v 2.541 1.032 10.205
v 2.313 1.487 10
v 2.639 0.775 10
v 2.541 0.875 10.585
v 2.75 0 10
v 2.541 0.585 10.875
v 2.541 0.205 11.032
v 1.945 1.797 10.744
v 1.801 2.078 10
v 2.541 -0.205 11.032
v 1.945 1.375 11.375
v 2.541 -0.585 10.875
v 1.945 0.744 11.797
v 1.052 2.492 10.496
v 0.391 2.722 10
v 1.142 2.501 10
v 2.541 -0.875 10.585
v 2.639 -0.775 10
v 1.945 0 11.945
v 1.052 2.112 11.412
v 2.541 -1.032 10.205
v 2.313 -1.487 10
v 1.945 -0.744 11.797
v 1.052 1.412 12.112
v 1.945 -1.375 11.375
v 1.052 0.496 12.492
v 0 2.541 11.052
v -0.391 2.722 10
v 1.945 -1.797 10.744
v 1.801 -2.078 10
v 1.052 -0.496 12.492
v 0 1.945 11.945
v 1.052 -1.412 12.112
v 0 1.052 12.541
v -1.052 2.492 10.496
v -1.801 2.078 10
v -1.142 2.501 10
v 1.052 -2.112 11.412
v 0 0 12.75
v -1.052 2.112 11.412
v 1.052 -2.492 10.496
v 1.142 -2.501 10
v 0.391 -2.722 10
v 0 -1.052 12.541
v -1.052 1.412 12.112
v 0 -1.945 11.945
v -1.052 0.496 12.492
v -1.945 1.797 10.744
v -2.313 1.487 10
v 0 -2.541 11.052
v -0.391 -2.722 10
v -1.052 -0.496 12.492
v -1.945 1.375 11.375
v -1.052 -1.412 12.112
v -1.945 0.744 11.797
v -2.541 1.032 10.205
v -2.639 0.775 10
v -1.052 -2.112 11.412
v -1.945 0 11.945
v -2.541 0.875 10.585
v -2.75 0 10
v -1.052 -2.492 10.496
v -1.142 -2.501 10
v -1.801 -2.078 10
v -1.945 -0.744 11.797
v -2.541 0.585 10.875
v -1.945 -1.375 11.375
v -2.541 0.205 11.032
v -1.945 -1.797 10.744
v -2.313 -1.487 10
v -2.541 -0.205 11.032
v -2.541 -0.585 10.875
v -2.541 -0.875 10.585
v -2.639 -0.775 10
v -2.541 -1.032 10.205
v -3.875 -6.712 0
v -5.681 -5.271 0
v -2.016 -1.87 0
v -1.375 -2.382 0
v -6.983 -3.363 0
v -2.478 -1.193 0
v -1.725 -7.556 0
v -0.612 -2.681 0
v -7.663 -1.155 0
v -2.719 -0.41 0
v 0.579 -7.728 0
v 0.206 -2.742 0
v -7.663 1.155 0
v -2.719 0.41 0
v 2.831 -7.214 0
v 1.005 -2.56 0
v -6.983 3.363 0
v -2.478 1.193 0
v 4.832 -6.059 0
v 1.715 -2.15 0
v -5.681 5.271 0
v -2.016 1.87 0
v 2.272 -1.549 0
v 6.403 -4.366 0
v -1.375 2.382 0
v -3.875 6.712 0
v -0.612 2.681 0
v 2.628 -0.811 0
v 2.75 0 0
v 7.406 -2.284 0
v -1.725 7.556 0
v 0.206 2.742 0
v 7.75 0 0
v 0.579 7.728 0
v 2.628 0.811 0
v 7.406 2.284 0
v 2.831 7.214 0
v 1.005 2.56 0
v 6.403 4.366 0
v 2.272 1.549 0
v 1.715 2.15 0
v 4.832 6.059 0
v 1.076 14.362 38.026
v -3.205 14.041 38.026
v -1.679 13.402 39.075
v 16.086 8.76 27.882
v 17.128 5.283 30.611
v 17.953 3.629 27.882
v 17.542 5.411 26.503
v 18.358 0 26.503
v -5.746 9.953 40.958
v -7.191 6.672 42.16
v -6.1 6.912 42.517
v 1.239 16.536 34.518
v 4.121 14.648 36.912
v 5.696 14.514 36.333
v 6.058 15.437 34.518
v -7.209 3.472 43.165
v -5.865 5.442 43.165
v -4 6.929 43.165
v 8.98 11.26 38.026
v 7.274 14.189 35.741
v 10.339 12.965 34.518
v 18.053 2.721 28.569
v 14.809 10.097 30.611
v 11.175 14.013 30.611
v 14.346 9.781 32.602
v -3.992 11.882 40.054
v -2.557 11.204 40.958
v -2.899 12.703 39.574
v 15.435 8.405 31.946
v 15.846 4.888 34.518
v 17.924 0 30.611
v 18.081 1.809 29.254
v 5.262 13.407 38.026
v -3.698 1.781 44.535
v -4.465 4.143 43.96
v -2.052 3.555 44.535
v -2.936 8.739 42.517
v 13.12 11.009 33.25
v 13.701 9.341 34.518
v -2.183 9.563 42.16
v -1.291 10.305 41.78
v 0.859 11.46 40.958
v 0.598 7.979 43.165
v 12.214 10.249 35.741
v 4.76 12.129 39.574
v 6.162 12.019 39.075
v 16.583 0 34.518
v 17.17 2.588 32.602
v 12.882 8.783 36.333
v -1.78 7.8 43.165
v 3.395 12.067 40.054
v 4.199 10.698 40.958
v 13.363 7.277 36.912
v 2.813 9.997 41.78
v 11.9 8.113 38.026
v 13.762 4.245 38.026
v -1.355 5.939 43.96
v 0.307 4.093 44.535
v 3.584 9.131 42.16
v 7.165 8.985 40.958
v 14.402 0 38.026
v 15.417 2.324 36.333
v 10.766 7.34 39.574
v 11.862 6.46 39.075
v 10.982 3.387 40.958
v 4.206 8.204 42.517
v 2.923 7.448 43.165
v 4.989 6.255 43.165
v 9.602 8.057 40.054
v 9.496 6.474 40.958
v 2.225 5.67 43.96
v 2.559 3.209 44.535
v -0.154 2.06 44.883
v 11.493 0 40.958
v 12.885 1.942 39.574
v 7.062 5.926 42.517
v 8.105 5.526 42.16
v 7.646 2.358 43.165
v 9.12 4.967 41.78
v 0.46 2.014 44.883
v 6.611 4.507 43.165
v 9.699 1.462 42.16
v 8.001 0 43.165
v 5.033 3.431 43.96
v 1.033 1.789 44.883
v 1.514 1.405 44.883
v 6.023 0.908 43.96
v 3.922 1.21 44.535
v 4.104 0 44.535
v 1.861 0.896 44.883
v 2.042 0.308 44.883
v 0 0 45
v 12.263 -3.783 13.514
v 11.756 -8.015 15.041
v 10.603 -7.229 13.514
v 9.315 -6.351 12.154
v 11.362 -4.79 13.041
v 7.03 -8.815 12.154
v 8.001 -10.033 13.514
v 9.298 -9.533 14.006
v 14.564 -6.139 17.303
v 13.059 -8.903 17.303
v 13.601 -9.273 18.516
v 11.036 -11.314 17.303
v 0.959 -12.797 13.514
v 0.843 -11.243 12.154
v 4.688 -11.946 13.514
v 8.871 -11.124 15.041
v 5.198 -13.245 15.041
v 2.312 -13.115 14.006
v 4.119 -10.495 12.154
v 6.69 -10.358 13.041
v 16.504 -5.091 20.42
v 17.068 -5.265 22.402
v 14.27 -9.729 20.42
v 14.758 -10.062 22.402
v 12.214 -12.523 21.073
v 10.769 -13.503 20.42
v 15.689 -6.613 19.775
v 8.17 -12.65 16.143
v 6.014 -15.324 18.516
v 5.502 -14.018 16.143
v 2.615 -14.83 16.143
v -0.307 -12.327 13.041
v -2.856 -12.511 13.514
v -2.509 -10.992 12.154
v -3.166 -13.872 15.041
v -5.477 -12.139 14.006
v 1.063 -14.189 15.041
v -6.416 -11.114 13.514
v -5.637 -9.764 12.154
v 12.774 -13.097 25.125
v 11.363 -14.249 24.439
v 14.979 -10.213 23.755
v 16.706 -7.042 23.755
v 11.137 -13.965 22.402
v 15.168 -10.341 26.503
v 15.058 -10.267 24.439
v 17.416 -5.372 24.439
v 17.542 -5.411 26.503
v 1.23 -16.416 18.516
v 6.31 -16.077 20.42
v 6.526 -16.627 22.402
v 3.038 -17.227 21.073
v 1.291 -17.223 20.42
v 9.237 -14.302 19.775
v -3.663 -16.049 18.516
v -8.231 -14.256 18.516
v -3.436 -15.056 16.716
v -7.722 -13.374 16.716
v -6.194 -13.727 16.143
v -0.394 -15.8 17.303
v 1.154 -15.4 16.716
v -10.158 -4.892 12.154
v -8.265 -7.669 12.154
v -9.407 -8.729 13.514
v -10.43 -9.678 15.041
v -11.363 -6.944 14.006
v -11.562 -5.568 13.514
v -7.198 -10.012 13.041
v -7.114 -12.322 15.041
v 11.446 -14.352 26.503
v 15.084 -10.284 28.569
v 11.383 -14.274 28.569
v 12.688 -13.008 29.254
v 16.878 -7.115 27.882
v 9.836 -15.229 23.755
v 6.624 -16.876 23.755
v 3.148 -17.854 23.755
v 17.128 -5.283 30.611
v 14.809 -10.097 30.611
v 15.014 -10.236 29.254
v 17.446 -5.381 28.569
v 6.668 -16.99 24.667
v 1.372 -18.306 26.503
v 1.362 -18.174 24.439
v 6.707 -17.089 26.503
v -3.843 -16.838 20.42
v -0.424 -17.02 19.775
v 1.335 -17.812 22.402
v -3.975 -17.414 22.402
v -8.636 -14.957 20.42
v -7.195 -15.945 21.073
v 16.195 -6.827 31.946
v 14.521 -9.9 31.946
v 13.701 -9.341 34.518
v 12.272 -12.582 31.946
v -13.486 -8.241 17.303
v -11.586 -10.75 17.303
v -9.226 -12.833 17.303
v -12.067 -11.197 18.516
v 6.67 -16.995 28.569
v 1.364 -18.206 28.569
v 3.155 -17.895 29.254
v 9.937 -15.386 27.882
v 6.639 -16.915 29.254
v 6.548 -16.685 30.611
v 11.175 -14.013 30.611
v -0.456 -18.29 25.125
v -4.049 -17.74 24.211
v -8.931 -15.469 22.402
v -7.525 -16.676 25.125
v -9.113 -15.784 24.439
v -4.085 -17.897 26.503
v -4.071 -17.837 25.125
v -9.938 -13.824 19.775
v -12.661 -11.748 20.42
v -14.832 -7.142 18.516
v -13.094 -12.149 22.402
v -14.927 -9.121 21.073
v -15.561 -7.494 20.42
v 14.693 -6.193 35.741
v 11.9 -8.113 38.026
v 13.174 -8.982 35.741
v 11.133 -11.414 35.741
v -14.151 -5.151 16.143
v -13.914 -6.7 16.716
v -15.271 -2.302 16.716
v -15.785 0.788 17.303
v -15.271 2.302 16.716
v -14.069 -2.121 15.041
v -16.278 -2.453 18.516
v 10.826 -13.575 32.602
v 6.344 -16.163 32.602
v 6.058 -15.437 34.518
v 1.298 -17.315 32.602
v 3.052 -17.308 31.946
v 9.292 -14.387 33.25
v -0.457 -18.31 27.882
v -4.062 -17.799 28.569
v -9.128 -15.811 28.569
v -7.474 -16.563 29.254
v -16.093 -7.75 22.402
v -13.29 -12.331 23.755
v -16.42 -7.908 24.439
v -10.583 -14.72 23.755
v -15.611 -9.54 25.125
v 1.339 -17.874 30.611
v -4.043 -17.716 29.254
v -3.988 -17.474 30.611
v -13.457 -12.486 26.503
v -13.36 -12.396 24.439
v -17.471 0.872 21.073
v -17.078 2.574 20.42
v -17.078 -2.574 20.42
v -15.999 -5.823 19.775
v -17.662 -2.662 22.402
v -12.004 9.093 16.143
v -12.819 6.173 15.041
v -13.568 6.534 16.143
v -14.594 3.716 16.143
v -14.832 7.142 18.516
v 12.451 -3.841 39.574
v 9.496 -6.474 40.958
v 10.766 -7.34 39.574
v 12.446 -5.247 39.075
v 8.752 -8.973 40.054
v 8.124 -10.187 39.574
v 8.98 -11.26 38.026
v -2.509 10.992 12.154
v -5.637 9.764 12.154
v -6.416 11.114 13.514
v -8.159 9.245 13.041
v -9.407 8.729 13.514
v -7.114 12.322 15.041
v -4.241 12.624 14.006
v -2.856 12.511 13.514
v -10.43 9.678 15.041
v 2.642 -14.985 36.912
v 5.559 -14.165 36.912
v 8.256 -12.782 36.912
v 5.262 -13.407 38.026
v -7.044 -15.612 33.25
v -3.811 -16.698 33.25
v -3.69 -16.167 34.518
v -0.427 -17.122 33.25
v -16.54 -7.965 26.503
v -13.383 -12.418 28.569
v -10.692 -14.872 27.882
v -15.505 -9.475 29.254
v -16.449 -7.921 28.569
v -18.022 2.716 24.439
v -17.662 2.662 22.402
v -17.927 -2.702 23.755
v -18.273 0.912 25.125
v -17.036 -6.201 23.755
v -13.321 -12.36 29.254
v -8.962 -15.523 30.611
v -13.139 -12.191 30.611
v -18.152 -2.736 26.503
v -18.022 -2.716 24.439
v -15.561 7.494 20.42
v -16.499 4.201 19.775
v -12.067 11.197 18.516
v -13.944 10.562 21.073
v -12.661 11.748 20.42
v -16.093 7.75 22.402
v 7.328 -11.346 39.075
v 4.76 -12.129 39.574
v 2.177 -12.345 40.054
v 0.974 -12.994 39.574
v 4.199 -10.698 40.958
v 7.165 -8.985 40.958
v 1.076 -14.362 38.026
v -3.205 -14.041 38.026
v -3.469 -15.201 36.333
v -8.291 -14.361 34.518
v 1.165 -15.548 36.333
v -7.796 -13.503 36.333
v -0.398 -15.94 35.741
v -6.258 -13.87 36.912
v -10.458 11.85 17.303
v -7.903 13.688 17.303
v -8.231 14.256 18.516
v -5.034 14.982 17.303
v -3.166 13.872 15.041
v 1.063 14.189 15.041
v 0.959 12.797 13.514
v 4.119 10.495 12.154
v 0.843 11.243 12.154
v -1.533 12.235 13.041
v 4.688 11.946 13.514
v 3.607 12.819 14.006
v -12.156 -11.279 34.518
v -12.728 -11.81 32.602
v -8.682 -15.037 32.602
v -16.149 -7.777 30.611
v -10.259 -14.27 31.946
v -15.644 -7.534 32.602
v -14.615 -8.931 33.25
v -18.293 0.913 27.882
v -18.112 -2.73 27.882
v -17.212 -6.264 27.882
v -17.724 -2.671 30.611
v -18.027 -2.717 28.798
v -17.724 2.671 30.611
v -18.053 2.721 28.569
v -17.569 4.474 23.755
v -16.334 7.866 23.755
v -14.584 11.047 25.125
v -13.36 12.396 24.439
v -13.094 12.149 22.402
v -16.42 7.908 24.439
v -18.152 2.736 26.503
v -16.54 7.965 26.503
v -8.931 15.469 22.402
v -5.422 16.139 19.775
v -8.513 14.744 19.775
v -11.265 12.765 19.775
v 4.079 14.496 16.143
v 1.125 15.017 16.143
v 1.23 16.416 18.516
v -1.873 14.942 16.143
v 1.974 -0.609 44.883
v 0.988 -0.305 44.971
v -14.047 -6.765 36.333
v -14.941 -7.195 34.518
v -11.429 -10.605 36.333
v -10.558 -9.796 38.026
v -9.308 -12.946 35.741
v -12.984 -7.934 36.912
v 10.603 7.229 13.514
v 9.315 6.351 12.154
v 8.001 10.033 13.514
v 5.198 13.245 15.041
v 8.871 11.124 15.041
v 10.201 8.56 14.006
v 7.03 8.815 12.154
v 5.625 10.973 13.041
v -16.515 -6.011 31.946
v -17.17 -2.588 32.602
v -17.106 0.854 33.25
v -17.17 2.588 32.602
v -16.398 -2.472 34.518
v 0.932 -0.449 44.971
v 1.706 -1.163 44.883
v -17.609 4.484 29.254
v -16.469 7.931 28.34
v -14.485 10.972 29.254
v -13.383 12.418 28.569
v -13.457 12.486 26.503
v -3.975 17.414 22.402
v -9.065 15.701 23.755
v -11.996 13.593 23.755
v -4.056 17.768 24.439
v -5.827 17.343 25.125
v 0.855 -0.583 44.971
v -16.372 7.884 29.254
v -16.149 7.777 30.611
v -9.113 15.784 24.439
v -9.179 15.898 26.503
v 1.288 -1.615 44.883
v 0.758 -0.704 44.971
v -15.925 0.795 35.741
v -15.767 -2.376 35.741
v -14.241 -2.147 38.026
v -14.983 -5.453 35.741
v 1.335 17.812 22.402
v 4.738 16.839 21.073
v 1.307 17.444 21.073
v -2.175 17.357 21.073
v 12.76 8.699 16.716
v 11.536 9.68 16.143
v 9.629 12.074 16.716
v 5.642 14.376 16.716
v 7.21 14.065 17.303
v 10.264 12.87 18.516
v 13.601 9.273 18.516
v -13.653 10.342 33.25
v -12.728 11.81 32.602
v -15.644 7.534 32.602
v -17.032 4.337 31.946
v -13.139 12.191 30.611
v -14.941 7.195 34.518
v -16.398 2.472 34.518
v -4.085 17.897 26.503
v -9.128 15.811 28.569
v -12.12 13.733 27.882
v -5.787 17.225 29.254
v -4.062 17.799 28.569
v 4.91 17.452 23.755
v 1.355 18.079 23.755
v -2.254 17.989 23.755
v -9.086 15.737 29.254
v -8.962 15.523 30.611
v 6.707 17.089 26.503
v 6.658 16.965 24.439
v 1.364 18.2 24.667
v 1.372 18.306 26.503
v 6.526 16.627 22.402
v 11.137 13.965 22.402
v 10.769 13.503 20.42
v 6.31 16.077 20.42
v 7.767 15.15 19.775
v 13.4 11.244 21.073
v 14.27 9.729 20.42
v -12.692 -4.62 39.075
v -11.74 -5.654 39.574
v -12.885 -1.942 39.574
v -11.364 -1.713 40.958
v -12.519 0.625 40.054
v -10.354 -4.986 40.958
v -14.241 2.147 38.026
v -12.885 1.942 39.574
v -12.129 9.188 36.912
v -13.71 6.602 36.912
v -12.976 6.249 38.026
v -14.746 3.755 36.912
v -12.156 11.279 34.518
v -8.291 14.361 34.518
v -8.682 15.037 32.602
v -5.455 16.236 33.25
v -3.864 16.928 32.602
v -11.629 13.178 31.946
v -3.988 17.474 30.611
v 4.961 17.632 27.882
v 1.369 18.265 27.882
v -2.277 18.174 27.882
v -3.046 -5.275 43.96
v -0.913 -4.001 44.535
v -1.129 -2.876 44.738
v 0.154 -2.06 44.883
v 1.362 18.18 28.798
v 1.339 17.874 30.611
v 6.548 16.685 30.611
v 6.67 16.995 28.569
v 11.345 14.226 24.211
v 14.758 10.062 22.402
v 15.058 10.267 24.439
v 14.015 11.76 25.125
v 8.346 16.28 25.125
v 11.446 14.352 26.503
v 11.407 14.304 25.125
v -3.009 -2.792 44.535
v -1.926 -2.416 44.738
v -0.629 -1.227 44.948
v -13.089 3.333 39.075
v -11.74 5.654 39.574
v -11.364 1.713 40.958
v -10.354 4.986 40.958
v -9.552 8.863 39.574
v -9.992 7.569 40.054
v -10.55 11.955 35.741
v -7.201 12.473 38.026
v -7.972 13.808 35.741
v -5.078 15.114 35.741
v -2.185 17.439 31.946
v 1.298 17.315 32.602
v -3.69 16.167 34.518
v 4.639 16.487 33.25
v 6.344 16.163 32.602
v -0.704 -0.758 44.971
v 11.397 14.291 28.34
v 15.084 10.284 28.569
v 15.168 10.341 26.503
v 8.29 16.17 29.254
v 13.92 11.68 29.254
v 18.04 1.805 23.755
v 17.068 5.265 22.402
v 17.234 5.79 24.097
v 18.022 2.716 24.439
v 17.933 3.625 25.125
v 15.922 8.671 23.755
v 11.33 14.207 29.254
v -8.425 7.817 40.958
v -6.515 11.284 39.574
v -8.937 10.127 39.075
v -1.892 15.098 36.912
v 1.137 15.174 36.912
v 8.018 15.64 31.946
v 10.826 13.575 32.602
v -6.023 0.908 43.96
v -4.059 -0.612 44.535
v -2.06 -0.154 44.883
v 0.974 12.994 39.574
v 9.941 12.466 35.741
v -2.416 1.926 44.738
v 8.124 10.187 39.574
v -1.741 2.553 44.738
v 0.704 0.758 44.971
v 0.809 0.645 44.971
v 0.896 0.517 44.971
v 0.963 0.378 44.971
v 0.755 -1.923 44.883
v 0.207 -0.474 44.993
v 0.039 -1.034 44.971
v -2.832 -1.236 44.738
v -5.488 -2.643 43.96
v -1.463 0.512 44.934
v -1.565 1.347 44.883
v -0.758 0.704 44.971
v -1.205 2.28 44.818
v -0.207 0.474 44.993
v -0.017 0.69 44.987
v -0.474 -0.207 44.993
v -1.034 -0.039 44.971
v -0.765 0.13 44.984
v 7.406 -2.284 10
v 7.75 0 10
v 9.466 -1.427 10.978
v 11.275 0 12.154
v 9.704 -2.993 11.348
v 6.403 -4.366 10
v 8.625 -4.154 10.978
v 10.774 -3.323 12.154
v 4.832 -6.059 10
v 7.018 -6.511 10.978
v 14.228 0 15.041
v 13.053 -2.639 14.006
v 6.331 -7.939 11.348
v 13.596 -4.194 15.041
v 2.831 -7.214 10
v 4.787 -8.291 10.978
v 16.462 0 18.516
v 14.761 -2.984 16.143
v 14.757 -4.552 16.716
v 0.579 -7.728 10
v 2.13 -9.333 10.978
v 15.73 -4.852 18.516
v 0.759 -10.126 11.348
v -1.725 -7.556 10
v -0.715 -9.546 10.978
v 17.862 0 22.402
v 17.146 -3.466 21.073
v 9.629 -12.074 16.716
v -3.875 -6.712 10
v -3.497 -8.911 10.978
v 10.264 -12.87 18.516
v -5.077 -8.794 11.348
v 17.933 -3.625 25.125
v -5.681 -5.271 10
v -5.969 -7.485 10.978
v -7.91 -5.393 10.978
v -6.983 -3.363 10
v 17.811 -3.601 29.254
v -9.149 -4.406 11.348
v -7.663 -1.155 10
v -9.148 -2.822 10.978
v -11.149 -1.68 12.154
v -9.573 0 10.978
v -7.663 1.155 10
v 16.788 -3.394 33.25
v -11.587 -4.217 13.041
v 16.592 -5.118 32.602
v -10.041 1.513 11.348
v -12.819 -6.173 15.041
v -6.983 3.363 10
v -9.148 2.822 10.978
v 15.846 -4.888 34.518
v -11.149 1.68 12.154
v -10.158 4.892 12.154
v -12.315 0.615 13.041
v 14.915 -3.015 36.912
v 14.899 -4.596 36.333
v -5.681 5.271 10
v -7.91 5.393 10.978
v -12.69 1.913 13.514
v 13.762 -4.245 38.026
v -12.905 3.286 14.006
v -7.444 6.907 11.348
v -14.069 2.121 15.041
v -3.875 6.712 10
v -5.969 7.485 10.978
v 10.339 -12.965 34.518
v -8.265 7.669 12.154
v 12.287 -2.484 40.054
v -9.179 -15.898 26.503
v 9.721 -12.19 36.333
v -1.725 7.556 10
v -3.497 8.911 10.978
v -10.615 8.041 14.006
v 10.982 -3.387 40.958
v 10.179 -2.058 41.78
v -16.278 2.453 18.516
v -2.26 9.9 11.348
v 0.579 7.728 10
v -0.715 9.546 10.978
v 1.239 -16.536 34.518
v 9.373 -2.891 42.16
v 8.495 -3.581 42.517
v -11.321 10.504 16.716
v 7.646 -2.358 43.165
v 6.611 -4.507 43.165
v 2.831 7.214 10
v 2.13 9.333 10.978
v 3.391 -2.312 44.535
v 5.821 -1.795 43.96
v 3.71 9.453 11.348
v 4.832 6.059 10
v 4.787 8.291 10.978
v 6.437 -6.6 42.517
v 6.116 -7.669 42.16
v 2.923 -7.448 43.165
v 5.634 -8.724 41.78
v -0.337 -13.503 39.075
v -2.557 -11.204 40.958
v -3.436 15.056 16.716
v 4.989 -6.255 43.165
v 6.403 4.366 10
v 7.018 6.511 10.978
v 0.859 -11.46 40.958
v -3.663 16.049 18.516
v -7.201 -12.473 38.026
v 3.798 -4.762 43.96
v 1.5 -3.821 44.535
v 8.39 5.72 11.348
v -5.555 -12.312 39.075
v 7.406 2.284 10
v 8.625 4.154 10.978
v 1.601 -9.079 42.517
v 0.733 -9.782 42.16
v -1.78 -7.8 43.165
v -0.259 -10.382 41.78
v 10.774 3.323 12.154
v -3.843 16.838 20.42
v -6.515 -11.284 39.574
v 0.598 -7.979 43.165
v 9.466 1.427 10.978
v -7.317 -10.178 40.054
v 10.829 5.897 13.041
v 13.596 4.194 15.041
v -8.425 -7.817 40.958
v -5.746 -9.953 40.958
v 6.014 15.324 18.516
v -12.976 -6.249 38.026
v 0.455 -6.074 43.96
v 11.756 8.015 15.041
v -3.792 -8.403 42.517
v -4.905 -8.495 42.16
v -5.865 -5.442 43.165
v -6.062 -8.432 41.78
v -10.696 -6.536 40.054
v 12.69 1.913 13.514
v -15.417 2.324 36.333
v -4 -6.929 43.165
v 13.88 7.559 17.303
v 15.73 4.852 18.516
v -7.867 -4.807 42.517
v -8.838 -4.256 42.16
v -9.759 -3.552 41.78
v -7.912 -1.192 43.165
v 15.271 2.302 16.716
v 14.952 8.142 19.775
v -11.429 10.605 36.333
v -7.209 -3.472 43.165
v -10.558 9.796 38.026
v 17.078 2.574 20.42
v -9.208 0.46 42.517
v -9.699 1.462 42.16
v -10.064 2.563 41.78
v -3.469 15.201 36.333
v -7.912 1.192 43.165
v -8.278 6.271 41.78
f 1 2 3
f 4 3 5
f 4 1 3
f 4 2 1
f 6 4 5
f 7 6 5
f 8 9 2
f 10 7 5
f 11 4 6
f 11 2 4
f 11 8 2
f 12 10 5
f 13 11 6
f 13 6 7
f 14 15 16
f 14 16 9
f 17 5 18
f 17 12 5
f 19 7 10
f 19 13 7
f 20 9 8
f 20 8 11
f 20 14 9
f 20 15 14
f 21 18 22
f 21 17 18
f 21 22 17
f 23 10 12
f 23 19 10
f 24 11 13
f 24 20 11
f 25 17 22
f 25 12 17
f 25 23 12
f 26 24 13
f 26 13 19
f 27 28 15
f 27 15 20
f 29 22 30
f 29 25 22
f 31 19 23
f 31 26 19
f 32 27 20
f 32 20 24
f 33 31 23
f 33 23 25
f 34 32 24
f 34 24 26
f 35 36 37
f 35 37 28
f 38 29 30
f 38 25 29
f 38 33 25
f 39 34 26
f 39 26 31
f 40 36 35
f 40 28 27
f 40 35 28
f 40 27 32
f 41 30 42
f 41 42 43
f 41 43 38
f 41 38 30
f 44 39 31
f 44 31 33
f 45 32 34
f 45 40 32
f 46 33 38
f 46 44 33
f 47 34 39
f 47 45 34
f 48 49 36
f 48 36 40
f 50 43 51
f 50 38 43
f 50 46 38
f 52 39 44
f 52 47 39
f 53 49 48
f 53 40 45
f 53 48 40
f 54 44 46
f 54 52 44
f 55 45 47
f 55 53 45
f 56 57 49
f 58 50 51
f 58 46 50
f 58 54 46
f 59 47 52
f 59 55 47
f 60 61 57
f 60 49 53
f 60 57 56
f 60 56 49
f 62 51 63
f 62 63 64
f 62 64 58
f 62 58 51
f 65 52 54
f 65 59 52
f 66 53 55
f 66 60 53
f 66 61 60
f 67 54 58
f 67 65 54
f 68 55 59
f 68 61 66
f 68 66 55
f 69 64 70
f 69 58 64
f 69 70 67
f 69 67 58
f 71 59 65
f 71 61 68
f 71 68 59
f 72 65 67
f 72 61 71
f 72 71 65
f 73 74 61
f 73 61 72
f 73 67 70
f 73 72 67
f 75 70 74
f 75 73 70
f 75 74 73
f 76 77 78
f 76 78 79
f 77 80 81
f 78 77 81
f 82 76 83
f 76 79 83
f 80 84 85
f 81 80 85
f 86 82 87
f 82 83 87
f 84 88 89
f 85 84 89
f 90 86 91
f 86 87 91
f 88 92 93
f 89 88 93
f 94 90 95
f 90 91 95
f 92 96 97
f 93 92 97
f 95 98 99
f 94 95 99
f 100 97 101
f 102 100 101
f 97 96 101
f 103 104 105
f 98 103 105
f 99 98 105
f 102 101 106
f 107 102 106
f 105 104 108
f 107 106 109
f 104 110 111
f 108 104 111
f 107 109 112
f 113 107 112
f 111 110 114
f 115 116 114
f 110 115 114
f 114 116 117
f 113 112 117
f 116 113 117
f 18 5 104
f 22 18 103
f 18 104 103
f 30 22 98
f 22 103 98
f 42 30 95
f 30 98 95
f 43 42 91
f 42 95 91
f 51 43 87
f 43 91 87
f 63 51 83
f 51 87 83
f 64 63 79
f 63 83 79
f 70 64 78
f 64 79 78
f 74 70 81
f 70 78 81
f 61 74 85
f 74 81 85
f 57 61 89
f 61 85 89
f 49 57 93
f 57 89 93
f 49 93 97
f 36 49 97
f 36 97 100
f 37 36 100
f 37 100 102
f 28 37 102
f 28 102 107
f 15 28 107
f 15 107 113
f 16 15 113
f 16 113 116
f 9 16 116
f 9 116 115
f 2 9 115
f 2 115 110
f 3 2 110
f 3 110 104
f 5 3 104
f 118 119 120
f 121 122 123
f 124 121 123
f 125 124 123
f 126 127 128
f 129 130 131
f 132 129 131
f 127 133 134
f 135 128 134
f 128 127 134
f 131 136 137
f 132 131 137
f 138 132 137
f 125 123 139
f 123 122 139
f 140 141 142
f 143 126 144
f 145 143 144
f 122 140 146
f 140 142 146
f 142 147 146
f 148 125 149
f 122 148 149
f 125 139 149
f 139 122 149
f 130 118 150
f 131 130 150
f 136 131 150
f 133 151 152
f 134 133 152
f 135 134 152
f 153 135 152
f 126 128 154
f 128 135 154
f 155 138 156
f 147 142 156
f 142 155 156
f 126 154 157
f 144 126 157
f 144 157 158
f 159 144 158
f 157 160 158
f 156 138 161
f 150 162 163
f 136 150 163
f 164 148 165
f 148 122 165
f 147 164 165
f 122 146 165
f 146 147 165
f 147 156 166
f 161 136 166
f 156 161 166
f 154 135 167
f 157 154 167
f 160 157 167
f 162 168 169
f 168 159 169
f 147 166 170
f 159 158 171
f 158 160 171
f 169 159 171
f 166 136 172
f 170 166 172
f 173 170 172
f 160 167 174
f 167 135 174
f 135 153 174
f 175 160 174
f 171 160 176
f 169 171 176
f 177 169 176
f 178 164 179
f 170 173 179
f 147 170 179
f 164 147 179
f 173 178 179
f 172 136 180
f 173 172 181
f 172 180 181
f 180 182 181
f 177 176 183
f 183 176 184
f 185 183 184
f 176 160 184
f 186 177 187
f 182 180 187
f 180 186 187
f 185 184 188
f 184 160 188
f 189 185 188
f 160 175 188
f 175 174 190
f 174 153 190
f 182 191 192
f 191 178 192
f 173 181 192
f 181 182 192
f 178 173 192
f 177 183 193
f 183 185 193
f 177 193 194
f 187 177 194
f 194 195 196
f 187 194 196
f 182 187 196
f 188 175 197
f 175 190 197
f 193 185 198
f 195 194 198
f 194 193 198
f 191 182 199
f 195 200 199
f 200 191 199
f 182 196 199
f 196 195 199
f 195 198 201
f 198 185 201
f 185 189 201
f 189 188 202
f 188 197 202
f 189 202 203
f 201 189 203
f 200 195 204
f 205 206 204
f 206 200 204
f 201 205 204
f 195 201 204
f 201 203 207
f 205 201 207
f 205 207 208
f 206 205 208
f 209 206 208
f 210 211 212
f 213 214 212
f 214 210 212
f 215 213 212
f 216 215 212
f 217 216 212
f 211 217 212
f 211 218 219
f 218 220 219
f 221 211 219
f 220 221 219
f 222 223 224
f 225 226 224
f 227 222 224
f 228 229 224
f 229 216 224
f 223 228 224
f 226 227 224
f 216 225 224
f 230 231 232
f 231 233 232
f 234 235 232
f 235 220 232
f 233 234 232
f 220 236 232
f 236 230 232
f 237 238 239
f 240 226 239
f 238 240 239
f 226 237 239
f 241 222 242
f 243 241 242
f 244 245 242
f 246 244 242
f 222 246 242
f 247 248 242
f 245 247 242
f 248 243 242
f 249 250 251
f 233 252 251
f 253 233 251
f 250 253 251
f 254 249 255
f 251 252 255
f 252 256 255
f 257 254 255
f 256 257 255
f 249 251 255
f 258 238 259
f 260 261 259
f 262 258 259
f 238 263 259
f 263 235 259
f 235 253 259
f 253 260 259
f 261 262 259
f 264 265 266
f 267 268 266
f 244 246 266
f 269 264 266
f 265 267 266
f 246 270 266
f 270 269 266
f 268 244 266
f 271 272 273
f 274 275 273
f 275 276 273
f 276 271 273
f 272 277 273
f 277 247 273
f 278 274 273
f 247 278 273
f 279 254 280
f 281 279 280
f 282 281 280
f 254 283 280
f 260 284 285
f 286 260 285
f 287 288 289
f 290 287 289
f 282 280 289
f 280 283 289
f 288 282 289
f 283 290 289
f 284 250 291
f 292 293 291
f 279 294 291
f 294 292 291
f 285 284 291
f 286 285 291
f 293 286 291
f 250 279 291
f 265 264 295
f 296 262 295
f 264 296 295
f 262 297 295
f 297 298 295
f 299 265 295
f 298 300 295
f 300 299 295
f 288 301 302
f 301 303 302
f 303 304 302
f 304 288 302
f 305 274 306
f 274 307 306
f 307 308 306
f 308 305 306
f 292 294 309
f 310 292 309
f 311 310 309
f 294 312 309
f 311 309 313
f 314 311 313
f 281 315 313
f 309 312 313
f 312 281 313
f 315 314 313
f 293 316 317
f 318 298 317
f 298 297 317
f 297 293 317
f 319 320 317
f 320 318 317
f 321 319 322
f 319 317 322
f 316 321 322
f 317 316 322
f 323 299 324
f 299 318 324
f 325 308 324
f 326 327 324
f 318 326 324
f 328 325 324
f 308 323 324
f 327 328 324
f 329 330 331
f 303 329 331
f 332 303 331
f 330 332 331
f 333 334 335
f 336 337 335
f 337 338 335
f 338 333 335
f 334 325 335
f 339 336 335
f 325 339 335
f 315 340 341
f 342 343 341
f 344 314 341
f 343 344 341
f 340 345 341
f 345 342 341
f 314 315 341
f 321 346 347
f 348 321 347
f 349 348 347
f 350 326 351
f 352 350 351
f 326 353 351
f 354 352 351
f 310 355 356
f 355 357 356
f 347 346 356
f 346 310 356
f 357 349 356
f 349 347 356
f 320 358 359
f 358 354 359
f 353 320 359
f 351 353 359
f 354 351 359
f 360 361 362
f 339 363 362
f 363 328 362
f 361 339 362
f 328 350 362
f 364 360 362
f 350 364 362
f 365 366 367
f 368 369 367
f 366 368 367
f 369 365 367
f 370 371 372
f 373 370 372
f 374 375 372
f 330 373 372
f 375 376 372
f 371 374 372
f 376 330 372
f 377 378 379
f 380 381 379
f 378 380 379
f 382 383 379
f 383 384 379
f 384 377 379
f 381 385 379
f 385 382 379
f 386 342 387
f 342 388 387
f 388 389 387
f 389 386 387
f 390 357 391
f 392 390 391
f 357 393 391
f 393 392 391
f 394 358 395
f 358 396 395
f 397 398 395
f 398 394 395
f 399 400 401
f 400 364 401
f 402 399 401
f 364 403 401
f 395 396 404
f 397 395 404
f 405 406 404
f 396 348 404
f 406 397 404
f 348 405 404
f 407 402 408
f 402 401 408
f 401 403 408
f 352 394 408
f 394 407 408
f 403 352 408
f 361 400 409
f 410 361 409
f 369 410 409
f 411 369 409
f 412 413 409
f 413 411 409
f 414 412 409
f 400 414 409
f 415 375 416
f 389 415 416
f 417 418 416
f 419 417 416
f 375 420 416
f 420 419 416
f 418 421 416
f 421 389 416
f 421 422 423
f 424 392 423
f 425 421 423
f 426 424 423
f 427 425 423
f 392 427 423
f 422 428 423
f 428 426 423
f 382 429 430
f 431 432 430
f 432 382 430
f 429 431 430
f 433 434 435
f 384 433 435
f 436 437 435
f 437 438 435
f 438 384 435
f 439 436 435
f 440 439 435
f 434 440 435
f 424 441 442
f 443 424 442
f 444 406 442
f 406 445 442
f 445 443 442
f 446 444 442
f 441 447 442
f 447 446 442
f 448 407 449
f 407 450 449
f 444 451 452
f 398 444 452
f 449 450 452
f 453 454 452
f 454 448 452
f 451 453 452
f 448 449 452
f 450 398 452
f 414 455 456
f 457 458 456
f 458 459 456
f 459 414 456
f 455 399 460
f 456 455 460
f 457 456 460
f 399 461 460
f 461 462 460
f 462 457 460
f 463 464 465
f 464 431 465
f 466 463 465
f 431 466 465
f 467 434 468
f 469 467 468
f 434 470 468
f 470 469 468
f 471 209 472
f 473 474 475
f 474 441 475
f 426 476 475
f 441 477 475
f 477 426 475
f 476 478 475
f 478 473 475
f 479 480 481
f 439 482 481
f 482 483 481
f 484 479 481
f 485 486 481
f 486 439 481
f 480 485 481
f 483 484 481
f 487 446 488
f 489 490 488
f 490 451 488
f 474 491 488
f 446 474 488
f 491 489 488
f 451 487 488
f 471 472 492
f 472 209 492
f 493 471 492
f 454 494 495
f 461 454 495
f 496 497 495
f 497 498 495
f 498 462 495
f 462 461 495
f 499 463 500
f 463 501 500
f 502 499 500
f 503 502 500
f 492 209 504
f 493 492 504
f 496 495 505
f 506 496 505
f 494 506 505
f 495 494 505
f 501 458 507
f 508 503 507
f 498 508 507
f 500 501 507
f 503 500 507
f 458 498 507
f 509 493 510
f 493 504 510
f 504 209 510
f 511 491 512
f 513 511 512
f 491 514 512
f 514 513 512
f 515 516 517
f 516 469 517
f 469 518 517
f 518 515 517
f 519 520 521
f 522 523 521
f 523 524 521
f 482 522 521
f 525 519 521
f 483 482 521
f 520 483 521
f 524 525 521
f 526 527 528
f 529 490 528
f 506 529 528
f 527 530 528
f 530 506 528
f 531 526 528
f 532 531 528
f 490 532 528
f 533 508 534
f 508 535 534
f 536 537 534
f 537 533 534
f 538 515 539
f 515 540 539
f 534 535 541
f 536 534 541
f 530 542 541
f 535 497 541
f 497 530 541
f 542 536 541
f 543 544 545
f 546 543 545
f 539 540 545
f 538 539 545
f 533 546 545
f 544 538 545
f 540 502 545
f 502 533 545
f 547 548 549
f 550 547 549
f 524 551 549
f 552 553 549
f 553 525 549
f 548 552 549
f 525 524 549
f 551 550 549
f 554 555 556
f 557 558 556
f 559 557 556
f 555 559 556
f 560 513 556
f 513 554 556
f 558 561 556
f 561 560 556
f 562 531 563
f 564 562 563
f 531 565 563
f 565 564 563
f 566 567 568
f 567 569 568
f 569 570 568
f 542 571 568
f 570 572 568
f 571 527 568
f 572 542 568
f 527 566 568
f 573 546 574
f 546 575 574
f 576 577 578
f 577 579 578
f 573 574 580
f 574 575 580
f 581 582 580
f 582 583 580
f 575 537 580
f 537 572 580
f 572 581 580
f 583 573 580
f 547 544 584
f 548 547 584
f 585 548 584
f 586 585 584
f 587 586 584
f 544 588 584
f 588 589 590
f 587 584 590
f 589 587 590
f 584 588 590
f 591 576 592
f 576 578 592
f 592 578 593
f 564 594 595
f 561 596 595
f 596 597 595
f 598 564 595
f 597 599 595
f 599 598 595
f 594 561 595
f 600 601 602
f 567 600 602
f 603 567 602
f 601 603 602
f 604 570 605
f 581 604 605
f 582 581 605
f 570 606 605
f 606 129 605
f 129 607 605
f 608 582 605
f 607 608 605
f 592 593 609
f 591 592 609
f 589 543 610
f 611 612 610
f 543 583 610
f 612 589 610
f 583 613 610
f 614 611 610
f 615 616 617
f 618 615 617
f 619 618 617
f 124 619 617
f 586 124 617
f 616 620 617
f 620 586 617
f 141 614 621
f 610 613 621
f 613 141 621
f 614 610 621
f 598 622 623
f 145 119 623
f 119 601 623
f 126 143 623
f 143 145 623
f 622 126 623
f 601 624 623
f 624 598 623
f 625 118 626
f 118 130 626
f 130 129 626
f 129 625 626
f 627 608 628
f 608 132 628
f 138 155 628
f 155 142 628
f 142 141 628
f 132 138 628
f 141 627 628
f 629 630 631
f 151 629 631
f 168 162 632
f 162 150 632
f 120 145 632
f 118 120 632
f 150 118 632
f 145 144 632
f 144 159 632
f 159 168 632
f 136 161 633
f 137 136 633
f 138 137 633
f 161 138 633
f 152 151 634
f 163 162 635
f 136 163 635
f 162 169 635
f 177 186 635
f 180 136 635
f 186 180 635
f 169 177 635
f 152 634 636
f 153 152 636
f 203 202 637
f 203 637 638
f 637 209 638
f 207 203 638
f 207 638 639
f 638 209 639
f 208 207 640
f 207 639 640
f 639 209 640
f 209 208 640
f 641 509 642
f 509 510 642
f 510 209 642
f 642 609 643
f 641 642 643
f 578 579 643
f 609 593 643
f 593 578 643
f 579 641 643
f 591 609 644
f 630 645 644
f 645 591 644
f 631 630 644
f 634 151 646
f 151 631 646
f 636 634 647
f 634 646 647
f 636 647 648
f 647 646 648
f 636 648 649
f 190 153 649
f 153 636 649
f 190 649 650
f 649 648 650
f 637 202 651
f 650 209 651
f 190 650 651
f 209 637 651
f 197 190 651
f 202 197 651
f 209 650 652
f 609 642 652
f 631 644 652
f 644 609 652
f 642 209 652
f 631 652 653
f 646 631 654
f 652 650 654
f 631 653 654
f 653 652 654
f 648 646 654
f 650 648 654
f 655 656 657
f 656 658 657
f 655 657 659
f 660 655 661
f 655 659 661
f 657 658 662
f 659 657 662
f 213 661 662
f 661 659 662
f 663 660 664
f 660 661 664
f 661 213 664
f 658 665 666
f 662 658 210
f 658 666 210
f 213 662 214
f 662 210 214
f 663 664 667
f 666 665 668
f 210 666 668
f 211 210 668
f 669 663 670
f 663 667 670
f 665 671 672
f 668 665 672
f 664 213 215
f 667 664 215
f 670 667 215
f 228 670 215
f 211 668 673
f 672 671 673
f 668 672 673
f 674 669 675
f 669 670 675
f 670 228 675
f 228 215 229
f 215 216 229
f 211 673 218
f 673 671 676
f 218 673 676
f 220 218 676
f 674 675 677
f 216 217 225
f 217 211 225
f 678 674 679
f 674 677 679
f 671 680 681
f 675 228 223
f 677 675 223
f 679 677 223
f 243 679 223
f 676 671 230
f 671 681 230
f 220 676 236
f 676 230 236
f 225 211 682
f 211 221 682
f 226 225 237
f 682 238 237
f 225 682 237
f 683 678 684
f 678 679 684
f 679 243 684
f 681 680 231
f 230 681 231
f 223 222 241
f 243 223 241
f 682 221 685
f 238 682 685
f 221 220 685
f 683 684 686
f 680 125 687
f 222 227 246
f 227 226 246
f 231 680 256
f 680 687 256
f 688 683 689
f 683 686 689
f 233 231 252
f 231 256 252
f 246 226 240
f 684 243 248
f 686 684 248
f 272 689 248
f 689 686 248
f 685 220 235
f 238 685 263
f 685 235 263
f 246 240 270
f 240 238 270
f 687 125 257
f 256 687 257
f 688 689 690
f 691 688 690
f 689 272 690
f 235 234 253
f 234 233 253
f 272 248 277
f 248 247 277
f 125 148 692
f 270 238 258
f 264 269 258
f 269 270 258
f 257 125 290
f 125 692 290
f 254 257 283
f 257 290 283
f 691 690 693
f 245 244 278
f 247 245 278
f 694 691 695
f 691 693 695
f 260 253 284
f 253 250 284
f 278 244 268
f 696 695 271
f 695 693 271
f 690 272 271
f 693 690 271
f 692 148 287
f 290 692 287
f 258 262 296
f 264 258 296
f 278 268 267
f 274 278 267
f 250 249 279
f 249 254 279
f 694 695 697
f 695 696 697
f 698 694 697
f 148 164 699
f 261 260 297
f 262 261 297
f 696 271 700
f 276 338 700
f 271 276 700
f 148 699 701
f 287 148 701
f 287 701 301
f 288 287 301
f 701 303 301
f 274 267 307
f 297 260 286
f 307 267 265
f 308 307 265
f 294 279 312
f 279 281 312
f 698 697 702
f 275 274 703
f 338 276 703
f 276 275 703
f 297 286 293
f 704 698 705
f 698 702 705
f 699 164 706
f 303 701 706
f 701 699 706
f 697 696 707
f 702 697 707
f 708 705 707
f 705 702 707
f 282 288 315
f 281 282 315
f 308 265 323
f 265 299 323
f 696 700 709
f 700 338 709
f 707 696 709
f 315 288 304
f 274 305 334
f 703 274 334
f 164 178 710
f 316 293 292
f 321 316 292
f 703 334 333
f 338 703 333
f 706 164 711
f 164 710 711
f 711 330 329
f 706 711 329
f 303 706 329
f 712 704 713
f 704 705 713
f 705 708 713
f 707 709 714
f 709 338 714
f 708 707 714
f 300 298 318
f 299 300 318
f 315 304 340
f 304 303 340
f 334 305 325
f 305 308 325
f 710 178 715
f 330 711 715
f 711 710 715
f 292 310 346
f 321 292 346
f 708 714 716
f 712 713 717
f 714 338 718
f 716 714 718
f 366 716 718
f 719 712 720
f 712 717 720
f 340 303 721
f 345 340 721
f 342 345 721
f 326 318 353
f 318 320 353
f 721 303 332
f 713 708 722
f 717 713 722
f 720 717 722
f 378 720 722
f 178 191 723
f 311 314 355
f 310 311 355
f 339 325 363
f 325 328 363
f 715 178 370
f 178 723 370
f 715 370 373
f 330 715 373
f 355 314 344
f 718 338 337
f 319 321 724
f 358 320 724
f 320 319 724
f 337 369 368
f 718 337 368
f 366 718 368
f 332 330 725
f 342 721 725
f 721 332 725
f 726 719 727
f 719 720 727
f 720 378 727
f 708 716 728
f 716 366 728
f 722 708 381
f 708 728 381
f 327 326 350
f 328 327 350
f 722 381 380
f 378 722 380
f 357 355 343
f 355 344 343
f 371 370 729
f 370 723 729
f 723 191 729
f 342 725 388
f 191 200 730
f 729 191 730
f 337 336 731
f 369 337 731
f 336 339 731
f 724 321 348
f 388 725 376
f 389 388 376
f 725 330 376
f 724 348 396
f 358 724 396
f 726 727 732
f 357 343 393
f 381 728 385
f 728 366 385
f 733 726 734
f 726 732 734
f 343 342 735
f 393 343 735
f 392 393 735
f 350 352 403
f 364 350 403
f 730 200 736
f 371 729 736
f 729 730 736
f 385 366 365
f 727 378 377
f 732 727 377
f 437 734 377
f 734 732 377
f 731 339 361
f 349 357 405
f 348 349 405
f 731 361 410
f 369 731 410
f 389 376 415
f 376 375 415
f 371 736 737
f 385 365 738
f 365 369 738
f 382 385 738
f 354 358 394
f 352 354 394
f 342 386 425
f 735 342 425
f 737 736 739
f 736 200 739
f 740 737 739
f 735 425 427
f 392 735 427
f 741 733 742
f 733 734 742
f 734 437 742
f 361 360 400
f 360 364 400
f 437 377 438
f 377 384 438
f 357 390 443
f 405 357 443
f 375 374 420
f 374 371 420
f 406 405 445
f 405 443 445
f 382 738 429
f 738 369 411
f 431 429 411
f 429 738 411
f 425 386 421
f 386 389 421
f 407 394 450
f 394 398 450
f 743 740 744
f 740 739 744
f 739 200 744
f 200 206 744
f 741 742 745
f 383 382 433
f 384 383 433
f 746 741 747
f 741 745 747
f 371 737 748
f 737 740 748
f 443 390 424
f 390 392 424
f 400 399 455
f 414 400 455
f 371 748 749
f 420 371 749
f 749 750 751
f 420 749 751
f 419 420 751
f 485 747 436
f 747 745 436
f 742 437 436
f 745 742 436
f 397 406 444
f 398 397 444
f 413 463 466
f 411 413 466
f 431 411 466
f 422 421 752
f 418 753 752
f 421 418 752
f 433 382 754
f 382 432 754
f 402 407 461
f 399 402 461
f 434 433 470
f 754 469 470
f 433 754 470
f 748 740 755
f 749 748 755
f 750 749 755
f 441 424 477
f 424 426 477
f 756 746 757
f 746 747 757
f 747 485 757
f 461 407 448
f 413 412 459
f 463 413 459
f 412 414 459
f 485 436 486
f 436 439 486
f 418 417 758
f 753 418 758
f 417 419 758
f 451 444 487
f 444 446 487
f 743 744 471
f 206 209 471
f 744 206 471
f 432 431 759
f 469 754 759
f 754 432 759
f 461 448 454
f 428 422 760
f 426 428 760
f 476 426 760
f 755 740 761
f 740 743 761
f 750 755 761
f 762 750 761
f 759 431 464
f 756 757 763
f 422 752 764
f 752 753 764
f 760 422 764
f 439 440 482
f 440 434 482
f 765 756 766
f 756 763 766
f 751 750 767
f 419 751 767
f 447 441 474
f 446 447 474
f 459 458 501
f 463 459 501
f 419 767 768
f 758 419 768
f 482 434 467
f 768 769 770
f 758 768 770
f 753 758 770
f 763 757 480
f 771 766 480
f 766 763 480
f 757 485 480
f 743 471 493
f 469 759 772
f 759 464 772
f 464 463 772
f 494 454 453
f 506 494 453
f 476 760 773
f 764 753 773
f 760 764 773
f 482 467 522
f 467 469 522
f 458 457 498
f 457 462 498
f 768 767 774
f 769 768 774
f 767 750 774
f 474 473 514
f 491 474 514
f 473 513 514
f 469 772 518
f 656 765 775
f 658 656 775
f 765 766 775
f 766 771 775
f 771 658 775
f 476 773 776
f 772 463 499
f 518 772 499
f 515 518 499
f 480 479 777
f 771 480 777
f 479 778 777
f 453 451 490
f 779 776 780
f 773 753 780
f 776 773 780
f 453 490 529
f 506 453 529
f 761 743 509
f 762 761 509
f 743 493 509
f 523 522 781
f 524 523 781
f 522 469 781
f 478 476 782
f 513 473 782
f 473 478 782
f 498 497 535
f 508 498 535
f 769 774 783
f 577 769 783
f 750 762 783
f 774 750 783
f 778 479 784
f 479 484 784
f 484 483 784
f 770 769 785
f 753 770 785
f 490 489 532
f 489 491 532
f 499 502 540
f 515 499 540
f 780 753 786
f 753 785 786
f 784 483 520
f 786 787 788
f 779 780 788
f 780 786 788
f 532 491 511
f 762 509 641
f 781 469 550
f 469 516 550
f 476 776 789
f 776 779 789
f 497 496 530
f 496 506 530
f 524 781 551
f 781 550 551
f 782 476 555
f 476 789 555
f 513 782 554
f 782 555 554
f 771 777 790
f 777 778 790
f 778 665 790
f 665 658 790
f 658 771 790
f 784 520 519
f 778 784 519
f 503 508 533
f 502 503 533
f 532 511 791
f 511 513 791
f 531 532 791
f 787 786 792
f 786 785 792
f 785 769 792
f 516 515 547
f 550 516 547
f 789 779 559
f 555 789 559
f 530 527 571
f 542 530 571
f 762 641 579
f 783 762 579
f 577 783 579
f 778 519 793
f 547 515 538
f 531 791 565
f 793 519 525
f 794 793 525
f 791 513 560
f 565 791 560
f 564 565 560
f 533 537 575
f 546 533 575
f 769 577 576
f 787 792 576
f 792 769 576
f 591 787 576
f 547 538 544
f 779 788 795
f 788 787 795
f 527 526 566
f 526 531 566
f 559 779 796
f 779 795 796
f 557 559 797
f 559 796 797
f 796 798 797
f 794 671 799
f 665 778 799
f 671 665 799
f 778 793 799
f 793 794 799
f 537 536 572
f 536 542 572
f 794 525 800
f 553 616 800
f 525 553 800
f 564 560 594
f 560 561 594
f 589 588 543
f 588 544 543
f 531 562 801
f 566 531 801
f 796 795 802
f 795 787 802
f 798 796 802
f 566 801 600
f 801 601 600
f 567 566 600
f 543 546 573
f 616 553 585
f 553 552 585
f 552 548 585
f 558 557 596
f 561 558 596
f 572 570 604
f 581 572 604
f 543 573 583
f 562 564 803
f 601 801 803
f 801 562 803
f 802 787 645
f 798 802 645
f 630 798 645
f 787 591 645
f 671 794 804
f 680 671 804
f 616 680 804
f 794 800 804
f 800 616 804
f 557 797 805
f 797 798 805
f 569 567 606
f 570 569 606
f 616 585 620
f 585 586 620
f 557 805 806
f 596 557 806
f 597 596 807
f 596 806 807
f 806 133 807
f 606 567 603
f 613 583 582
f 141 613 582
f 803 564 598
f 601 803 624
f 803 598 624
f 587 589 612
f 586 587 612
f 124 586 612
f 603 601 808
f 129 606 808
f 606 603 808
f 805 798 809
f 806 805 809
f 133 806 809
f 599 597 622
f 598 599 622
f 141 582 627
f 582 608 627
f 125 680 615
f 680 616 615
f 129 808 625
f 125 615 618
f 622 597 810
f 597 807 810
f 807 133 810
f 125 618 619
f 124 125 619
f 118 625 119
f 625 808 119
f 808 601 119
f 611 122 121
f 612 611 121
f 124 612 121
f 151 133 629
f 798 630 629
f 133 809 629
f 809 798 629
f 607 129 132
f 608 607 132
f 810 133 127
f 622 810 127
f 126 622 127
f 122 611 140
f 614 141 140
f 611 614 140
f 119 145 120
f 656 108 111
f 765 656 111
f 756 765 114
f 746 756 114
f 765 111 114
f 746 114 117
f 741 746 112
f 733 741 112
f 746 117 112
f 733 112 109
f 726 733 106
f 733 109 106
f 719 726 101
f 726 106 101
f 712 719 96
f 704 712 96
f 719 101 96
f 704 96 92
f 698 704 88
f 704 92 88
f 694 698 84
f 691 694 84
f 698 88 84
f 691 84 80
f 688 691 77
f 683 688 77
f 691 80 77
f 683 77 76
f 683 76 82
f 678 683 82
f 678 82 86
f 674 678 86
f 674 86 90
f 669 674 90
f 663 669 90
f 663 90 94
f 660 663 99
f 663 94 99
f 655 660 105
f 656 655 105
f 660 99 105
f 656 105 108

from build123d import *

# Parameters (mm, degrees)
F0_R     = 7.75
F1_DEPTH = 10
F4_R     = 2.75
F5_DEPTH = 10


with BuildPart() as f1:
    # F0 (on Top) → F1 (new body)
    with BuildSketch(Plane.XY):
        Circle(F0_R)
    extrude(amount=F1_DEPTH)

    # F2 (on Front) → F3 (revolve)
    with BuildSketch(Plane.XZ):
        with BuildLine():
            ThreePointArc((0, 8.283929), (18.358036, 26.641964), (0, 45))
            Line((0, 45), (0, 8.283929))
        make_face()
    revolve(axis=Axis((0, 0, 26.641964), (0, 0, -1)))

    # F4 (on face) → F5 (cut)
    with BuildSketch(Plane(origin=(0, 0, 0), x_dir=(1, 0, 0), z_dir=(0, 0, -1))):
        Circle(F4_R)
    extrude(amount=-F5_DEPTH, mode=Mode.SUBTRACT)

    # F6 (on Front) → F7 (revolve, cut)
    with BuildSketch(Plane.XZ):
        with BuildLine():
            ThreePointArc((2.75, 10), (0, 12.75), (-2.75, 10))
            Line((-2.75, 10), (2.75, 10))
        make_face()
    revolve(axis=Axis((0, 0, 10), (1, 0, 0)), mode=Mode.SUBTRACT)


solid = f1.part
